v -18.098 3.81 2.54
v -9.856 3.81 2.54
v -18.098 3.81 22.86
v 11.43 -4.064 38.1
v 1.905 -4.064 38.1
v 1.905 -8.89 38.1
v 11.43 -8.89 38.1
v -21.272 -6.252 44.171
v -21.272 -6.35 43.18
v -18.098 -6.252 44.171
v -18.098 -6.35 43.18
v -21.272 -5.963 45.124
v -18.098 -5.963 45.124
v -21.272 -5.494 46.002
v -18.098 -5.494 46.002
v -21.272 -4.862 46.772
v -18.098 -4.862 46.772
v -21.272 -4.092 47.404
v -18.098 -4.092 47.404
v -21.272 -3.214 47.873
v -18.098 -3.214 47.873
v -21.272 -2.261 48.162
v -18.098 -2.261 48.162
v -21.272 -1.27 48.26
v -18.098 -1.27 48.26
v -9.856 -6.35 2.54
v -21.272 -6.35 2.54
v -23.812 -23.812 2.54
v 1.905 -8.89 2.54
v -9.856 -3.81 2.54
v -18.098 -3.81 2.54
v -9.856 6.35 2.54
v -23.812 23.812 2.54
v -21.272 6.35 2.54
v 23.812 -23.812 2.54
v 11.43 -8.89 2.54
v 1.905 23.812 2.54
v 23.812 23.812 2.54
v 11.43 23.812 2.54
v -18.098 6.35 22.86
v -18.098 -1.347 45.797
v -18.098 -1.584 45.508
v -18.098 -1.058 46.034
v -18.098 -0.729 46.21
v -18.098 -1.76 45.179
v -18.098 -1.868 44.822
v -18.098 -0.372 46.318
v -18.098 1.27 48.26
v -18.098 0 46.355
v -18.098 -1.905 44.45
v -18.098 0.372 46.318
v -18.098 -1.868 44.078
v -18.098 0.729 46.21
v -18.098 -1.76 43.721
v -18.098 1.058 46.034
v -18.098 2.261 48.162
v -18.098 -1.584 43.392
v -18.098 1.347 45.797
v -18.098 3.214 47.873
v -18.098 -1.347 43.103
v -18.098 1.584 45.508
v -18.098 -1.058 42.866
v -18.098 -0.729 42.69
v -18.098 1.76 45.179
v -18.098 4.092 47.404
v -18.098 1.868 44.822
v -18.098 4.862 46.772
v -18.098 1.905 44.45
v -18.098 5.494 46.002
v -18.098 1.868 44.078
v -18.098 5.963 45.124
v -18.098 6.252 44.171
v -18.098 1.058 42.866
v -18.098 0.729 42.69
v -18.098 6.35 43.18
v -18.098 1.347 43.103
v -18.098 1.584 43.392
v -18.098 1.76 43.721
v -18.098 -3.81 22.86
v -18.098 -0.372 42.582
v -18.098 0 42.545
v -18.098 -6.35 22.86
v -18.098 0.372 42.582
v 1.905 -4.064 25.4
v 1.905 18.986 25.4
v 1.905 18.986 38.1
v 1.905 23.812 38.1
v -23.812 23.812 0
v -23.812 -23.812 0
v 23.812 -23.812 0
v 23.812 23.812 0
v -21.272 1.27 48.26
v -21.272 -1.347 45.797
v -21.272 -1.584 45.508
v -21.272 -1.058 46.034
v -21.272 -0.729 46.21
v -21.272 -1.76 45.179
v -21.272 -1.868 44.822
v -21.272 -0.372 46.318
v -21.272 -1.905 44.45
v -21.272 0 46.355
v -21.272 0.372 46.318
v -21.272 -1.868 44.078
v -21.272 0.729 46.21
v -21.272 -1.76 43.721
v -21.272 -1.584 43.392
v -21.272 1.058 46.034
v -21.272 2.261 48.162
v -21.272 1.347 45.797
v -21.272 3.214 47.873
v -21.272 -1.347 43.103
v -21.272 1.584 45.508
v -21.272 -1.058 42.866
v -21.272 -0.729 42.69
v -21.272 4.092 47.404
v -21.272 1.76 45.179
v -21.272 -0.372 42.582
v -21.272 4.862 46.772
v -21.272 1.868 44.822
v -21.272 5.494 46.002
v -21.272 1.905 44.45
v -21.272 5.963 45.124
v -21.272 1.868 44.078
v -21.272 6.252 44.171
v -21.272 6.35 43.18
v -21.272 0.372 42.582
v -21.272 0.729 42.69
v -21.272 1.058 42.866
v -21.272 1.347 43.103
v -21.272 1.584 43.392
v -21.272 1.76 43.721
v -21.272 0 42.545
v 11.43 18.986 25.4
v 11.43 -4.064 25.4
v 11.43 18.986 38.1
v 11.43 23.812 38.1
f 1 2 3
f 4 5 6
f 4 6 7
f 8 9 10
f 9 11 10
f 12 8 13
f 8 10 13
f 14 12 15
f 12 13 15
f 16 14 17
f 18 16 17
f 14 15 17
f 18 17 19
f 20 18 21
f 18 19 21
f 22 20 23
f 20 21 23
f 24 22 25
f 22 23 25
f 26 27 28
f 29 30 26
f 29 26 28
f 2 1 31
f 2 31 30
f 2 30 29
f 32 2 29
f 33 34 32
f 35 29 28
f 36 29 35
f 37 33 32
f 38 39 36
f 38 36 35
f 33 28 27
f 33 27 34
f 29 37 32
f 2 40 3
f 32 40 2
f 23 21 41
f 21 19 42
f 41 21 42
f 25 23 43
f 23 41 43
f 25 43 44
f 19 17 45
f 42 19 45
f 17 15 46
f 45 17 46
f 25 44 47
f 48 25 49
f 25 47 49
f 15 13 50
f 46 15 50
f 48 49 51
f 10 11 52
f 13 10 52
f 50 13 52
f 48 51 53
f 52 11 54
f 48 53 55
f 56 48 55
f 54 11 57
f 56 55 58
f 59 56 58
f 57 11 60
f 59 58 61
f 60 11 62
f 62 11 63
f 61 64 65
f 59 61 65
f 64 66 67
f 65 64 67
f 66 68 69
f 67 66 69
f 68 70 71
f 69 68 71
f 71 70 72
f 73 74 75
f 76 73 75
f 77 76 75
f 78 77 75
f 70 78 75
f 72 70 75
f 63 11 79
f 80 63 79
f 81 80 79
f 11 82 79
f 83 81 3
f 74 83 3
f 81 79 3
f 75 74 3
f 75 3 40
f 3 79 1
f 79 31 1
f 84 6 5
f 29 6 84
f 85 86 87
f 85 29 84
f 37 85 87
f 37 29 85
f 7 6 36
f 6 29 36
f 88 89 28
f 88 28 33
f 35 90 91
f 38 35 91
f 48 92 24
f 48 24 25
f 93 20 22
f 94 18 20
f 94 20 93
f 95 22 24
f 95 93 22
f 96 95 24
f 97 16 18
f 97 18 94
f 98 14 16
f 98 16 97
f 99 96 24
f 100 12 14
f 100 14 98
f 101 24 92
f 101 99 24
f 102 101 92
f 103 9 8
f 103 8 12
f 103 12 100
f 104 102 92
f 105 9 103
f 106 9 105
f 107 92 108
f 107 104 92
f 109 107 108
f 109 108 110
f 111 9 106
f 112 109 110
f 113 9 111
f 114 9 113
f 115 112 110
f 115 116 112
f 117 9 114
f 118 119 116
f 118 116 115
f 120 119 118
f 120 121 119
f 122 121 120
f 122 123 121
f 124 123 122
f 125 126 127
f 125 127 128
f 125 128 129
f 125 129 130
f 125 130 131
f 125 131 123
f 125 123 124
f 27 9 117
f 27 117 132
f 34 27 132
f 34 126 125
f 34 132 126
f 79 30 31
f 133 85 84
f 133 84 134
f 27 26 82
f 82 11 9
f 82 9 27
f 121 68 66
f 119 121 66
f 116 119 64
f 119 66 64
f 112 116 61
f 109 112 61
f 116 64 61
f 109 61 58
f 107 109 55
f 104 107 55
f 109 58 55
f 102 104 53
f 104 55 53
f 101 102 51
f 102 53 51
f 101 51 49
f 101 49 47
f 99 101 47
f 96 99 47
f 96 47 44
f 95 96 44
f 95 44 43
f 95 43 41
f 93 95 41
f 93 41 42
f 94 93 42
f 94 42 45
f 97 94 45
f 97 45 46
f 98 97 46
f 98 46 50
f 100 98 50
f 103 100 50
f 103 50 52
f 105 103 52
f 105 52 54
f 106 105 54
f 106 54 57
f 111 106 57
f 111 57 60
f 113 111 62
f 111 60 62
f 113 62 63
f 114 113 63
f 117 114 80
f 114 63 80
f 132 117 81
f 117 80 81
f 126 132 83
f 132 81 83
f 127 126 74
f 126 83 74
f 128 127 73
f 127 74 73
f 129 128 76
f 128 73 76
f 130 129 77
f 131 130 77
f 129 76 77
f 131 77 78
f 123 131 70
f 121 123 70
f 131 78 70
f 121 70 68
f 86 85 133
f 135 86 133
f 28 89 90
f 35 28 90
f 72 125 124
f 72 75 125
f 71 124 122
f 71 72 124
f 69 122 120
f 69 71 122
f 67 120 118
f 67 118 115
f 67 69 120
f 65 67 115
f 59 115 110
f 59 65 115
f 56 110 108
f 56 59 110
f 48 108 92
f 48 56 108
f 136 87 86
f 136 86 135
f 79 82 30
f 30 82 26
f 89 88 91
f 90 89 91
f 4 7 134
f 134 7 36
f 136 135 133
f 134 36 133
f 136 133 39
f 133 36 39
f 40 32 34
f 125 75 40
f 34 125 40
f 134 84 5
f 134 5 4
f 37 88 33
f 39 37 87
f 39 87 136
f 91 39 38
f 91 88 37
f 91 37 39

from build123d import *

# Parameters (mm, degrees)
F0_W      = 47.625
F0_H      = 47.625
F1_DEPTH  = 2.54
F3_W      = 9.525
F3_H      = 32.7025
F4_DEPTH  = 22.86
F5_W      = 9.525
F5_H      = 4.826
F6_DEPTH  = 12.7
F7_W      = 3.175
F7_H      = 12.7
F8_DEPTH  = 45.72
F9_R      = 1.905
F10_DEPTH = 25.4
F11_R     = 5.08
F13_DEPTH = 2.54


# Not quite as in the source:
# - a pattern or mirror of a feature is missing from the dataset's text; its kind, count and spacing are read off the source's solid


with BuildPart() as f1:
    # F0 (on Top) → F1 (new body)
    with BuildSketch(Plane.XY):
        Rectangle(F0_W, F0_H)
    extrude(amount=F1_DEPTH)

    # F3 (on face) → F4 (join)
    with BuildSketch(Plane.XY.offset(2.54)):
        with Locations((6.6675, 7.46125)):
            Rectangle(F3_W, F3_H)
    extrude(amount=F4_DEPTH)

    # F5 (on face) → F6 (join)
    with BuildSketch(Plane.XY.offset(25.4)):
        with Locations((6.6675, -6.477)):
            Rectangle(F5_W, F5_H)
        with Locations((6.6675, 21.3995)):
            Rectangle(F5_W, F5_H)
    extrude(amount=F6_DEPTH)

    # F7 (on face) → F8 (join)
    with BuildSketch(Plane.XY.offset(2.54)):
        with Locations((-19.685, 0)):
            Rectangle(F7_W, F7_H)
    extrude(amount=F8_DEPTH)

    # F9 (on face) → F10 (cut)
    with BuildSketch(Plane.YZ.offset(-18.0975)):
        with Locations((0, 44.45)):
            Circle(F9_R)
    extrude(amount=-F10_DEPTH, mode=Mode.SUBTRACT)

    # F11
    f11_edges = [f1.edges().sort_by_distance(p)[0] for p in [
        (-19.685, 6.35, 48.26),
        (-19.685, -6.35, 48.26),
    ]]
    fillet(f11_edges, radius=F11_R)

    # F12 (on face) → F13 (join)
    with BuildSketch(Plane(origin=(0, 6.35, 0), x_dir=(-1, 0, 0), z_dir=(0, 1, 0))):
        Polygon((18.0975, 2.54), (18.0975, 22.86), (9.8562051214, 2.54), align=None)
    f13 = extrude(amount=-F13_DEPTH)

    # F13_copies: F13 across plane
    add(f13.mirror(Plane(origin=(0, 0, 0), x_dir=(0, 0, -1), z_dir=(0, -1, 0))))


solid = f1.part
